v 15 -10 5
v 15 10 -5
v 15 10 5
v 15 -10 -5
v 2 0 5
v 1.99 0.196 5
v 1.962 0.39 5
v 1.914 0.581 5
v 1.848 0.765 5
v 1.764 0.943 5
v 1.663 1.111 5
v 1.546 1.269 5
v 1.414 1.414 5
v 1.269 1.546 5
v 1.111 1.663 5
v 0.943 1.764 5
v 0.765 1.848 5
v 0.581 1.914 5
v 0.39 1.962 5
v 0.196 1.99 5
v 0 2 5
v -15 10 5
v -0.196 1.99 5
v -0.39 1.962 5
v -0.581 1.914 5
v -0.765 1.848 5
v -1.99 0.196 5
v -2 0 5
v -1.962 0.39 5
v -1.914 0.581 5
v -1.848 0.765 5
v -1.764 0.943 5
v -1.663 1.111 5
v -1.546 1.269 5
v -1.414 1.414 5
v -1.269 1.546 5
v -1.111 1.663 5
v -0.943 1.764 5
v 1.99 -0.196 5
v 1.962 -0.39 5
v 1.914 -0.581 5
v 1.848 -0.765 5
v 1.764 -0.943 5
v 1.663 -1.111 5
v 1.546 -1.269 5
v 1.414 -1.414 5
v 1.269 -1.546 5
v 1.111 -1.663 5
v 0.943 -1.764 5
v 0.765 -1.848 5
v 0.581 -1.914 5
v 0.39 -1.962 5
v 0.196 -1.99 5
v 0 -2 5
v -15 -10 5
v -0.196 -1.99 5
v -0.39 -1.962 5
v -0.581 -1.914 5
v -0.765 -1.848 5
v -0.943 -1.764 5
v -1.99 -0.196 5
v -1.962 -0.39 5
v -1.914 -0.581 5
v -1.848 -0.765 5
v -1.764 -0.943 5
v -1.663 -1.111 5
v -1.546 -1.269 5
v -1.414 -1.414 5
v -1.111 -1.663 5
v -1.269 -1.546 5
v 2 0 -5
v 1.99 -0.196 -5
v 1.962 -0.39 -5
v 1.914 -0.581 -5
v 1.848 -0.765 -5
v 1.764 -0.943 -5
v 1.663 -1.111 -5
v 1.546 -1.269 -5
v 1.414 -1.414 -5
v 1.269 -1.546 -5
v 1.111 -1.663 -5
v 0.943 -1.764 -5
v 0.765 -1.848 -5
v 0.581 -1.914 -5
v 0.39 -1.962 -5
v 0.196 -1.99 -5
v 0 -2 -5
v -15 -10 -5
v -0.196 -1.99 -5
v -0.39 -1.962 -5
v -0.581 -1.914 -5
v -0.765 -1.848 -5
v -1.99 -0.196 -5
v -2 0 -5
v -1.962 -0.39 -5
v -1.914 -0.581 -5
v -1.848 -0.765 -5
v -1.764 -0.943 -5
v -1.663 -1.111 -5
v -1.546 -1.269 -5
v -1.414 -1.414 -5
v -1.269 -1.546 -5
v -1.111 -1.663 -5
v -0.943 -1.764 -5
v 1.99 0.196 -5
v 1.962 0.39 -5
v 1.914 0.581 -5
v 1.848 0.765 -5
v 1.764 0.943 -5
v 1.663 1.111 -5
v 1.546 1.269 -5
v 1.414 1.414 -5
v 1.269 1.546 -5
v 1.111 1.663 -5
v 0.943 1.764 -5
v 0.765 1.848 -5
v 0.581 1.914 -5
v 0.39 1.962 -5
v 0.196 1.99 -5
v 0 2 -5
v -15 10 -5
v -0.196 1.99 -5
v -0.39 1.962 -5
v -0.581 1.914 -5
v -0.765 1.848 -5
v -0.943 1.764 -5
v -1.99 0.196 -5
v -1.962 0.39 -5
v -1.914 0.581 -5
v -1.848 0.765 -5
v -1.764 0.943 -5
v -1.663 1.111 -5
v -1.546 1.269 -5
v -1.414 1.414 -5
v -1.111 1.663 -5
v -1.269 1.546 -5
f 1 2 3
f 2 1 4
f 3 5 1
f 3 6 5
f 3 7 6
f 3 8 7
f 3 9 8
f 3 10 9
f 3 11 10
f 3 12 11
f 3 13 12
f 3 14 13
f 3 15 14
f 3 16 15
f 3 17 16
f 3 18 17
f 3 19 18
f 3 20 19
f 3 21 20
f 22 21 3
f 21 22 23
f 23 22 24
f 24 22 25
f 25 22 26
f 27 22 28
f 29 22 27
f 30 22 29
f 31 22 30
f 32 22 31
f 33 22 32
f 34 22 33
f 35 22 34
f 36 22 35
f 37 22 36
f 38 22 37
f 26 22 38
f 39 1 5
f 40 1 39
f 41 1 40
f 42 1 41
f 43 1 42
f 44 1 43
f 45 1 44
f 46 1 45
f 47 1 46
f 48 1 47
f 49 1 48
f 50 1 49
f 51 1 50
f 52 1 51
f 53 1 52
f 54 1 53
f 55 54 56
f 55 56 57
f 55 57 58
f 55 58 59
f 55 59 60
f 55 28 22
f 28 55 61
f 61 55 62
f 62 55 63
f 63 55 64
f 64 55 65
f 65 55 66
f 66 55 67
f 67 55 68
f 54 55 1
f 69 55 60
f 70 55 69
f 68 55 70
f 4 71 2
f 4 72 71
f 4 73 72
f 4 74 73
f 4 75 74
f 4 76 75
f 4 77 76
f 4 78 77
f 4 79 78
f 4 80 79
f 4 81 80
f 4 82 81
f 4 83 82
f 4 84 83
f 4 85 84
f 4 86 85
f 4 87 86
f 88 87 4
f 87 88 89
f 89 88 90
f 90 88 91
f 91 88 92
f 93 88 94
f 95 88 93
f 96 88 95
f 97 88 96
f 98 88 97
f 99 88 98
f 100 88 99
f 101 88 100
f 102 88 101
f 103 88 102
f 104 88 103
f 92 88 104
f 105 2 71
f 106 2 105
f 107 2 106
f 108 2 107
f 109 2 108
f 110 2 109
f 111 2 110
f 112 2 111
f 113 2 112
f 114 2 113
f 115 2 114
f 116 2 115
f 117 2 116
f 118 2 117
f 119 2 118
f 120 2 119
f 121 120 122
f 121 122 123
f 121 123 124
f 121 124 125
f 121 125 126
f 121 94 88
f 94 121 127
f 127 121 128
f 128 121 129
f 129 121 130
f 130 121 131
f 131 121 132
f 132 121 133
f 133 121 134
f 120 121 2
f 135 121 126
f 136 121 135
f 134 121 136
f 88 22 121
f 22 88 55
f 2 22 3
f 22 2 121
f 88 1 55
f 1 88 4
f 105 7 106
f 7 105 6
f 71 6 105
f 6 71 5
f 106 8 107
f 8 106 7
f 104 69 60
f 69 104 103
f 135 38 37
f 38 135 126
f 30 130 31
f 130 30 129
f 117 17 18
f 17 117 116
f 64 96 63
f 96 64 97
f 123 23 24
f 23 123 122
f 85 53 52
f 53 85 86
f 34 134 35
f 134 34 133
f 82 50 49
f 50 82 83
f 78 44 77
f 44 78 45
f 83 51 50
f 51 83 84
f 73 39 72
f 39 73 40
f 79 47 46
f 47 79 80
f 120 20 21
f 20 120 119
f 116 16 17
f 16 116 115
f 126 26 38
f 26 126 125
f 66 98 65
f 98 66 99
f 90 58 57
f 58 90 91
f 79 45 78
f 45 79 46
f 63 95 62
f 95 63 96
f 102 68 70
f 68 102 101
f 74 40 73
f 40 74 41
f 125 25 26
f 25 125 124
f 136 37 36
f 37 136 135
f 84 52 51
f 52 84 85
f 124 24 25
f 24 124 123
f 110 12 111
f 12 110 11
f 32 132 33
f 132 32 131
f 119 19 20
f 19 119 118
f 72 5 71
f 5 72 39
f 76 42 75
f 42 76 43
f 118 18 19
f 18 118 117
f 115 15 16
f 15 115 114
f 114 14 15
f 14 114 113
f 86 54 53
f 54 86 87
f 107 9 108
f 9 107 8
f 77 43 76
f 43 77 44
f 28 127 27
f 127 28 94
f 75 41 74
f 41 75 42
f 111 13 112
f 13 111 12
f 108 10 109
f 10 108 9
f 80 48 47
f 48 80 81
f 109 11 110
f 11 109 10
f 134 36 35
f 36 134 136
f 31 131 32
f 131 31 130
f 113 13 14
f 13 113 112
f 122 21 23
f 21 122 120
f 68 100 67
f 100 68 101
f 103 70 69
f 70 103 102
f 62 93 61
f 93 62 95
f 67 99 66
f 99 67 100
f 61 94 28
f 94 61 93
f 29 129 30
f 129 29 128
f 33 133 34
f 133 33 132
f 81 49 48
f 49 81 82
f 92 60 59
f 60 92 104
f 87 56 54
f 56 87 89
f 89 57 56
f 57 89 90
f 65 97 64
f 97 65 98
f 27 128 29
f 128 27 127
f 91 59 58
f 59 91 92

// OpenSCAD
// Editable parameterized sample. Millimeters. Not approved for printing.
length = 30;
width = 20;
height = 10;
hole_diameter = 4;
$fn = 64;
difference() {
    cube([length, width, height], center=true);
    cylinder(h=height+2, d=hole_diameter, center=true);
}
